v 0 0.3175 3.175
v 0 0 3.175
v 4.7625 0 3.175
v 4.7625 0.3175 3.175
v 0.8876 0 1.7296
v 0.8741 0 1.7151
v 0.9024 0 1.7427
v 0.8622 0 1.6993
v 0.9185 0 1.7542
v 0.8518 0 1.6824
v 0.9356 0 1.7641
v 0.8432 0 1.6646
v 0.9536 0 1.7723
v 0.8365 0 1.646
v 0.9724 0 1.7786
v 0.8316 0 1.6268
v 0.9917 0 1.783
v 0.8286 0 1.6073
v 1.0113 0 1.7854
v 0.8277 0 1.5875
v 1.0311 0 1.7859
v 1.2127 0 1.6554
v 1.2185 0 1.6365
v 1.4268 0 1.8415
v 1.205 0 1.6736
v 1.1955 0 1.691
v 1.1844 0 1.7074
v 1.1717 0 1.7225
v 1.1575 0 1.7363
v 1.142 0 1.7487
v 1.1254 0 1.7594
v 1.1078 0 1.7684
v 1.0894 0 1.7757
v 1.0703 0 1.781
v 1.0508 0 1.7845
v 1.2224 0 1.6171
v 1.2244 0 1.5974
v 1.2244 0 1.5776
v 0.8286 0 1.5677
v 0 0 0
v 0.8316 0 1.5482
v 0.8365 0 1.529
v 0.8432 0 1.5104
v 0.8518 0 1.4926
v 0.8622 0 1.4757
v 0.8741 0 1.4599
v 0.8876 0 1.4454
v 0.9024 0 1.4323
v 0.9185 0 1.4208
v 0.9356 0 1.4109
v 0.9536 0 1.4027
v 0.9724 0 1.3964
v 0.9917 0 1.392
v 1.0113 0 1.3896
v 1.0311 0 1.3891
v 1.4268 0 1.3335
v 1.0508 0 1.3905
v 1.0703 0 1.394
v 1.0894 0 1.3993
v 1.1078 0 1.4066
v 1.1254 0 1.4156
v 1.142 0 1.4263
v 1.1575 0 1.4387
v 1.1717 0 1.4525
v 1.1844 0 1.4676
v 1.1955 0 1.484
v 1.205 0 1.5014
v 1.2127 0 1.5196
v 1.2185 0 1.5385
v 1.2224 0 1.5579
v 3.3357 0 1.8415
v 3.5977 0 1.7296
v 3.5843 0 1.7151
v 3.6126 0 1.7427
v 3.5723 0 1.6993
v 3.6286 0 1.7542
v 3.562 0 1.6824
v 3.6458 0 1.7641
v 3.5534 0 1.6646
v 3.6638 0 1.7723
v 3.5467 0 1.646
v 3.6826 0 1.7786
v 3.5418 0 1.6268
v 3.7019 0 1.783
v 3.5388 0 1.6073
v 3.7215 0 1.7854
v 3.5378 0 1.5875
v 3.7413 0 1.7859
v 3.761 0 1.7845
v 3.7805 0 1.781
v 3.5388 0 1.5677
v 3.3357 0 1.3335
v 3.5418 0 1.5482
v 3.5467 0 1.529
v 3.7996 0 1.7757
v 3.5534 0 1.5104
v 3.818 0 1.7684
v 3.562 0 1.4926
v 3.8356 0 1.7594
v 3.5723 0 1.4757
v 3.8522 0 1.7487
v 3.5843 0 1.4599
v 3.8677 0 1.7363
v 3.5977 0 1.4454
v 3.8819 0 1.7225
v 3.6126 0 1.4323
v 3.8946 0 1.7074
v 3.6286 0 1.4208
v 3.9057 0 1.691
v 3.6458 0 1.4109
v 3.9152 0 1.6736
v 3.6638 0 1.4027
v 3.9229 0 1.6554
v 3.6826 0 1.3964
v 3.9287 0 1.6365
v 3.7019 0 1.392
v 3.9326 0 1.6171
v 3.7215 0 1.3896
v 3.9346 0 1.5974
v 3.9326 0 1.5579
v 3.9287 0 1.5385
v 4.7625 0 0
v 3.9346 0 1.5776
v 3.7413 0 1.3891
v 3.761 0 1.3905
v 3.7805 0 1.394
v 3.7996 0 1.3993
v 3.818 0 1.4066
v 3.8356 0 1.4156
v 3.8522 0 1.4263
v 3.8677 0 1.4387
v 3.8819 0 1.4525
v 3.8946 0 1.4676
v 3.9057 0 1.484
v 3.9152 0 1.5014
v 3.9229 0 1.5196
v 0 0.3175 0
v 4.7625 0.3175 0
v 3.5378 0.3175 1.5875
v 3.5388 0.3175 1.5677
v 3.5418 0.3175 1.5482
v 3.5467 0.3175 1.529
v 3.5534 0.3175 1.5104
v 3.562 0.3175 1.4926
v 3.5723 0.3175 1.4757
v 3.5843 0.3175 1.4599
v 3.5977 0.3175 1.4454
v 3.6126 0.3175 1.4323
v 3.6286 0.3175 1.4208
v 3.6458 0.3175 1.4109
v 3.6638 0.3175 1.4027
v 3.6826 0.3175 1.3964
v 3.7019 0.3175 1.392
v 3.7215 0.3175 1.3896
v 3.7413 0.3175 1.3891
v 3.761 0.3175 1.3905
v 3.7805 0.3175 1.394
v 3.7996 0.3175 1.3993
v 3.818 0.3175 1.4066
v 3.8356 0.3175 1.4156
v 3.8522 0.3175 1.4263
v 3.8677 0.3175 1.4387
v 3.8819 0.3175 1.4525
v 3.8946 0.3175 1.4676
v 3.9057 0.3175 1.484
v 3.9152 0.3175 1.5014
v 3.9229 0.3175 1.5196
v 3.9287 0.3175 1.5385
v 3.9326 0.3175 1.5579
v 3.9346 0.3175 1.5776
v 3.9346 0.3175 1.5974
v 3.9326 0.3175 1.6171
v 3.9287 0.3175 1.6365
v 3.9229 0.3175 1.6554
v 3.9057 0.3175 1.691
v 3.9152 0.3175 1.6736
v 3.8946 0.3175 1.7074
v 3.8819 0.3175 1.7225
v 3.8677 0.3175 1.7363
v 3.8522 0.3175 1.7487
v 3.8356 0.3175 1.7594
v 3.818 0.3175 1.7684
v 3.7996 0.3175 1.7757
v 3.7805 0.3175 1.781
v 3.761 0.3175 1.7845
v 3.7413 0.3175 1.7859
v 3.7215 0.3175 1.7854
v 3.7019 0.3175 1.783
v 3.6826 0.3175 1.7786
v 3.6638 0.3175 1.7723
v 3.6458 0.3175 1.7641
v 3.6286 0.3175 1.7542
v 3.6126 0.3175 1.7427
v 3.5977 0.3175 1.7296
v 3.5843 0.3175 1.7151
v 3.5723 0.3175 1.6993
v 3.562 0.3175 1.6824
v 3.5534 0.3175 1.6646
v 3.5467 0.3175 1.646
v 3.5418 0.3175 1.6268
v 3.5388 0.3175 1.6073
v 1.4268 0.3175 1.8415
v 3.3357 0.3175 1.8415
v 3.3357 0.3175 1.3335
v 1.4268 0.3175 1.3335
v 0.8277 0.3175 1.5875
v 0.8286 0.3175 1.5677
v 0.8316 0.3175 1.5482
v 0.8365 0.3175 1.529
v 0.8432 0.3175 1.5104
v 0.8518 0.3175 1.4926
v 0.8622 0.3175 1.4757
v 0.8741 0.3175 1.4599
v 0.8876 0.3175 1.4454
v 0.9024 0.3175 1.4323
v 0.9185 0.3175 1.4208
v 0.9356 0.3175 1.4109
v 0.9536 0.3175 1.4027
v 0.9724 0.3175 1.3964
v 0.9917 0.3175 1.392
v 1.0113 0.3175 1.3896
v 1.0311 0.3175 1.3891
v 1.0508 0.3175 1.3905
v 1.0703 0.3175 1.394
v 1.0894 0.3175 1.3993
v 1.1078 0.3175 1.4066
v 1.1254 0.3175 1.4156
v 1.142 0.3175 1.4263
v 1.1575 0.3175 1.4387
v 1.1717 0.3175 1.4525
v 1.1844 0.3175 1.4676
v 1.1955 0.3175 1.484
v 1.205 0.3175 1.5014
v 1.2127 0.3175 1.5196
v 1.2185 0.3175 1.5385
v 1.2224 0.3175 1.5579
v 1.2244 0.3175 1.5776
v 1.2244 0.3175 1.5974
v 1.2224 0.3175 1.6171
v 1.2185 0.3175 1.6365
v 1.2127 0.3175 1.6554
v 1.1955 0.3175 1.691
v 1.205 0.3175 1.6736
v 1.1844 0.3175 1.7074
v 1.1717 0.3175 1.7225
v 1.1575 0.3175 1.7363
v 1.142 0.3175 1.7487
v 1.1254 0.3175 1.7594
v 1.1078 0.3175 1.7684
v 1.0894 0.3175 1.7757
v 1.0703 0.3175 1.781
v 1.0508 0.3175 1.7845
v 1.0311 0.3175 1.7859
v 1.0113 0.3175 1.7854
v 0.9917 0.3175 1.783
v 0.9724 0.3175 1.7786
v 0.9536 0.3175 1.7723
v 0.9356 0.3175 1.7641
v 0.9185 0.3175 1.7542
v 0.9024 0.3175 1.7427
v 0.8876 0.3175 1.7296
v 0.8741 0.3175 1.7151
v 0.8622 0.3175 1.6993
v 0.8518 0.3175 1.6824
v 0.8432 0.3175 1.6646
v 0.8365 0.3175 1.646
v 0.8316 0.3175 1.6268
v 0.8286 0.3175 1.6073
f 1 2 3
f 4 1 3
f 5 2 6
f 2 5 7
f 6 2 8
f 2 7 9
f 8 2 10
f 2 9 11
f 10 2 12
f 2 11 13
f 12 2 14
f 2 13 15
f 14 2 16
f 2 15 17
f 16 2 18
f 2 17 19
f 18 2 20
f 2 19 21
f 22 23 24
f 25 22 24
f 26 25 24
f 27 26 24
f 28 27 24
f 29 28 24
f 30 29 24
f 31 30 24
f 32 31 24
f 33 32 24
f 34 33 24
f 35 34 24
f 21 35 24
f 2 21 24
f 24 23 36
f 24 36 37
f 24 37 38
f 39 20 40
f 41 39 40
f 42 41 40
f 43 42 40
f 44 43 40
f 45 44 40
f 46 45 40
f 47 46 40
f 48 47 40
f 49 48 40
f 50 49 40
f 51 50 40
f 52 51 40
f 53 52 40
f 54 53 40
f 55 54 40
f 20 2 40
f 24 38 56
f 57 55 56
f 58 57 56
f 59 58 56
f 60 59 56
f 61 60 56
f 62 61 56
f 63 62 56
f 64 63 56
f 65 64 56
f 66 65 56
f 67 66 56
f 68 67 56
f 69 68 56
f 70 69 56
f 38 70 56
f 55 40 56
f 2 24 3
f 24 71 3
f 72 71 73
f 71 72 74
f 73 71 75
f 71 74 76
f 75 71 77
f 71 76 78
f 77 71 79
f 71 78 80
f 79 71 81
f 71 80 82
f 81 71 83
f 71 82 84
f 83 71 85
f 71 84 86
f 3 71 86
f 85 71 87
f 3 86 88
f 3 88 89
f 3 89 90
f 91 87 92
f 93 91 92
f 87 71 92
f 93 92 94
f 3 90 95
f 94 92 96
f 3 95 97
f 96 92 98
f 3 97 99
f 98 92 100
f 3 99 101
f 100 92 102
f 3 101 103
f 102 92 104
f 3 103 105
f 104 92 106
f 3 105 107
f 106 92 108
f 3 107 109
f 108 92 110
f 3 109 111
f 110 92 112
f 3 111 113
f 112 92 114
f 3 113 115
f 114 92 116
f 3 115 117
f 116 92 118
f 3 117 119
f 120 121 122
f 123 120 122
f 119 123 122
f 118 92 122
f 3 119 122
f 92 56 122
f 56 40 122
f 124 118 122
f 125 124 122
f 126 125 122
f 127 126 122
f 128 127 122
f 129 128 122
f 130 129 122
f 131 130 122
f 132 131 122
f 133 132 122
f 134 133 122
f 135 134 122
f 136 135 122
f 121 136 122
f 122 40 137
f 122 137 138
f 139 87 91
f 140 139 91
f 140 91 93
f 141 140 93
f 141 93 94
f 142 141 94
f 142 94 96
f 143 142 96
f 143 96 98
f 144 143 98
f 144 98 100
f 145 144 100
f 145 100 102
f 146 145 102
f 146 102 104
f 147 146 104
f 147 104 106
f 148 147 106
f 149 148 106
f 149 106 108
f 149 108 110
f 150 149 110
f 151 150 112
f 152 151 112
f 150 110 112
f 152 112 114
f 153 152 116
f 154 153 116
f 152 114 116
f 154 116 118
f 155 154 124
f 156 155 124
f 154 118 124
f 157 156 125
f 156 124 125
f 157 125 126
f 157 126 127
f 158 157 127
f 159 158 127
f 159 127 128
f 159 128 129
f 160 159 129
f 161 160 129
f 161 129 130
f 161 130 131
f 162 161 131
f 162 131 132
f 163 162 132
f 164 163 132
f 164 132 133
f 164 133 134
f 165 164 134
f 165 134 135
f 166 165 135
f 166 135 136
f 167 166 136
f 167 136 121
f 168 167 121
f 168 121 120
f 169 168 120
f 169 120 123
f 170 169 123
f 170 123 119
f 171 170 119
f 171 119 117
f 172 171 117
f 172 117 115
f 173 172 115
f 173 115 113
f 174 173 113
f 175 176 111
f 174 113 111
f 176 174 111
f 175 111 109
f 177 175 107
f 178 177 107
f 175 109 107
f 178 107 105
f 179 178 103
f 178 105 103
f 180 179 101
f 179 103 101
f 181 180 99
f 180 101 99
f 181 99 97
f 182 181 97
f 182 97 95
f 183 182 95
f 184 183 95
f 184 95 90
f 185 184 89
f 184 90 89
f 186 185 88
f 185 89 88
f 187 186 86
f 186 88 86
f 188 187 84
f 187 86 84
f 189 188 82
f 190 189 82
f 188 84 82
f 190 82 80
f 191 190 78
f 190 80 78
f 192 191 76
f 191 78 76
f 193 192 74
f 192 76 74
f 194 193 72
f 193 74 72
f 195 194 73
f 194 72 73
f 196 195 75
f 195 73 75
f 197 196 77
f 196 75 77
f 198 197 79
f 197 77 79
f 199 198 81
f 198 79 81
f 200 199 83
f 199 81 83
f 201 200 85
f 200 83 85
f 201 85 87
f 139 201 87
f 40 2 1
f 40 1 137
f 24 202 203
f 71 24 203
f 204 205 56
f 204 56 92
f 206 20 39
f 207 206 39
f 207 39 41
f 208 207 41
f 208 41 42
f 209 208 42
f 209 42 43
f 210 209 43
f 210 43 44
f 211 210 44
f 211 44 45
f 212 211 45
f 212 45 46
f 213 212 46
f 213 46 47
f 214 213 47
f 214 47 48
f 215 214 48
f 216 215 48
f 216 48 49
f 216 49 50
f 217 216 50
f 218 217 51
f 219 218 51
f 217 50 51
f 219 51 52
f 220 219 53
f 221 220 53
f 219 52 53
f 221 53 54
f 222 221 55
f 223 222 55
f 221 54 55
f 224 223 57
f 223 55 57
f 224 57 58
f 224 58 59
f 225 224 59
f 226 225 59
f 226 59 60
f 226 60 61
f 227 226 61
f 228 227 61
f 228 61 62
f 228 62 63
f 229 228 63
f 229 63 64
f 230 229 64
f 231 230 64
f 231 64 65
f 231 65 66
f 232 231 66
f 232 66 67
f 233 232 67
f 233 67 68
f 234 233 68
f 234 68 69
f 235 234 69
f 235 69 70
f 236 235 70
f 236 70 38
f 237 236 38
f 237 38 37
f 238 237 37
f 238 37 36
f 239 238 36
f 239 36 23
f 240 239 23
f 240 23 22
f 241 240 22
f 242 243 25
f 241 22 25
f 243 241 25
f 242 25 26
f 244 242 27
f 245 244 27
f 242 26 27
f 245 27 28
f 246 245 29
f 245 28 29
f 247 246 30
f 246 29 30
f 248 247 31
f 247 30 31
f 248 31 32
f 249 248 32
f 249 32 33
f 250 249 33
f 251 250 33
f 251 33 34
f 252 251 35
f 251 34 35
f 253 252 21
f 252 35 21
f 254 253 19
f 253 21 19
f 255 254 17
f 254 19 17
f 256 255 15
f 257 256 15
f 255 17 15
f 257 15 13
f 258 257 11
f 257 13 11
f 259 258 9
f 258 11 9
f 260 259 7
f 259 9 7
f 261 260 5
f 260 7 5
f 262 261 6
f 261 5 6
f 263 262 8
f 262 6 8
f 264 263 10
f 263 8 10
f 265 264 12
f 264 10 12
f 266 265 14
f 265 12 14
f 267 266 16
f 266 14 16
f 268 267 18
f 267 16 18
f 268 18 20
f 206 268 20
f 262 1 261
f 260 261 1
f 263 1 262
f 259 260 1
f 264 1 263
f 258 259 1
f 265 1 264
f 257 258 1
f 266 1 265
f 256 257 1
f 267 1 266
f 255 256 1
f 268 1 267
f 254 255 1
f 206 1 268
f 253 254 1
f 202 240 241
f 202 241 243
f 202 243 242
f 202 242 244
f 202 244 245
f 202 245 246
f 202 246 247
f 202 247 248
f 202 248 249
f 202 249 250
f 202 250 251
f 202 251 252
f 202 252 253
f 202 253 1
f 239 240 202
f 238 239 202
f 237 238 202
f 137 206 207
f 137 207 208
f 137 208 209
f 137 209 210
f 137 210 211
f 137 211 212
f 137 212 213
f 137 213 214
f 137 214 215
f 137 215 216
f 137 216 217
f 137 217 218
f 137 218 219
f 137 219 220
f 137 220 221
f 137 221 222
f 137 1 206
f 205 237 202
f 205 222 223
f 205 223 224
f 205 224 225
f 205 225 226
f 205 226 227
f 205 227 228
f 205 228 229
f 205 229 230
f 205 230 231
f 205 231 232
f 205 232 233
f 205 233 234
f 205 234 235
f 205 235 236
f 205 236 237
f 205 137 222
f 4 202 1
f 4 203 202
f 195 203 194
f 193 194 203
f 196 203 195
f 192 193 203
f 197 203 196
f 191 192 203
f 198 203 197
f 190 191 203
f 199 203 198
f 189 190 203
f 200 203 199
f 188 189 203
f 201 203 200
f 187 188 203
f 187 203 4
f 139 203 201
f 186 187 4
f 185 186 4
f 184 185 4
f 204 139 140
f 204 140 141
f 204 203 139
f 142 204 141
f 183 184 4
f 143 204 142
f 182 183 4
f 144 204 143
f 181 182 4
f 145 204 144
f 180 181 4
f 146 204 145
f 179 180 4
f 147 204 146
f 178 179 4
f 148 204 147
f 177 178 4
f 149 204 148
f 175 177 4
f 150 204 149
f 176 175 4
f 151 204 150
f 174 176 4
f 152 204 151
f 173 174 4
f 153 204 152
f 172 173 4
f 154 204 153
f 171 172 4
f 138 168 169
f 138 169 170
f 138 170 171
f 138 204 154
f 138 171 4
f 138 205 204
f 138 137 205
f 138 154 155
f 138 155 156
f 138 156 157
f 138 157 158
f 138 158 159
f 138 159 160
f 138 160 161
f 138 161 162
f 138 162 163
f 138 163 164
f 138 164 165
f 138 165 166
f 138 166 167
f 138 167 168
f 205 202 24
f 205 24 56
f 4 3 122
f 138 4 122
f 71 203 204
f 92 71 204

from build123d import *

# Parameters (mm, degrees)
SKETCH1_W                           = 4.7625
SKETCH1_H                           = 3.175
BOSS_EXTRUDE1_DEPTH                 = 0.3175
F_1_64_0_01563_DIAMETER_HOLE1_D     = 0.397002
F_1_64_0_01563_DIAMETER_HOLE1_DEPTH = 6.35
F_1_64_0_01563_DIAMETER_HOLE1_TIP   = 0.166562116
F_1_64_0_01563_DIAMETER_HOLE2_D     = 0.397002
F_1_64_0_01563_DIAMETER_HOLE2_DEPTH = 6.35
F_1_64_0_01563_DIAMETER_HOLE2_TIP   = 0.166562116
SKETCH9_W                           = 1.908955312
SKETCH9_H                           = 0.508
CUT_EXTRUDE1_DEPTH                  = 6.732611752


with BuildPart() as part:
    # Sketch1 → Boss-Extrude1 (new body)
    with BuildSketch(Plane(origin=(0, 0, 0), x_dir=(1, 0, 0), z_dir=(0, 1, 0))):
        with Locations((2.38125, -1.5875)):
            Rectangle(SKETCH1_W, SKETCH1_H)
    extrude(amount=BOSS_EXTRUDE1_DEPTH)

    # 1/64 (0.01563) Diameter Hole1
    with Locations(Plane(origin=(0, 0.3175, 0), x_dir=(1, 0, 0), z_dir=(0, 1, 0))):
        with Locations((1.02616, -1.5875)):
            Hole(F_1_64_0_01563_DIAMETER_HOLE1_D / 2, depth=F_1_64_0_01563_DIAMETER_HOLE1_DEPTH)
            with Locations((0, 0, -(F_1_64_0_01563_DIAMETER_HOLE1_DEPTH + F_1_64_0_01563_DIAMETER_HOLE1_TIP / 2))):  # 100° drill point
                Cone(0, F_1_64_0_01563_DIAMETER_HOLE1_D / 2, F_1_64_0_01563_DIAMETER_HOLE1_TIP, mode=Mode.SUBTRACT)

    # 1/64 (0.01563) Diameter Hole2
    with Locations(Plane(origin=(0, 0.3175, 0), x_dir=(1, 0, 0), z_dir=(0, 1, 0))):
        with Locations((3.73634, -1.5875)):
            Hole(F_1_64_0_01563_DIAMETER_HOLE2_D / 2, depth=F_1_64_0_01563_DIAMETER_HOLE2_DEPTH)
            with Locations((0, 0, -(F_1_64_0_01563_DIAMETER_HOLE2_DEPTH + F_1_64_0_01563_DIAMETER_HOLE2_TIP / 2))):  # 100° drill point
                Cone(0, F_1_64_0_01563_DIAMETER_HOLE2_D / 2, F_1_64_0_01563_DIAMETER_HOLE2_TIP, mode=Mode.SUBTRACT)

    # Sketch9 → Cut-Extrude1 (cut, through all)
    with BuildSketch(Plane(origin=(0, 0.3175, 0), x_dir=(1, 0, 0), z_dir=(0, 1, 0))):
        with Locations((2.38125, -1.5875)):
            Rectangle(SKETCH9_W, SKETCH9_H)
    extrude(amount=-CUT_EXTRUDE1_DEPTH, mode=Mode.SUBTRACT)


solid = part.part
